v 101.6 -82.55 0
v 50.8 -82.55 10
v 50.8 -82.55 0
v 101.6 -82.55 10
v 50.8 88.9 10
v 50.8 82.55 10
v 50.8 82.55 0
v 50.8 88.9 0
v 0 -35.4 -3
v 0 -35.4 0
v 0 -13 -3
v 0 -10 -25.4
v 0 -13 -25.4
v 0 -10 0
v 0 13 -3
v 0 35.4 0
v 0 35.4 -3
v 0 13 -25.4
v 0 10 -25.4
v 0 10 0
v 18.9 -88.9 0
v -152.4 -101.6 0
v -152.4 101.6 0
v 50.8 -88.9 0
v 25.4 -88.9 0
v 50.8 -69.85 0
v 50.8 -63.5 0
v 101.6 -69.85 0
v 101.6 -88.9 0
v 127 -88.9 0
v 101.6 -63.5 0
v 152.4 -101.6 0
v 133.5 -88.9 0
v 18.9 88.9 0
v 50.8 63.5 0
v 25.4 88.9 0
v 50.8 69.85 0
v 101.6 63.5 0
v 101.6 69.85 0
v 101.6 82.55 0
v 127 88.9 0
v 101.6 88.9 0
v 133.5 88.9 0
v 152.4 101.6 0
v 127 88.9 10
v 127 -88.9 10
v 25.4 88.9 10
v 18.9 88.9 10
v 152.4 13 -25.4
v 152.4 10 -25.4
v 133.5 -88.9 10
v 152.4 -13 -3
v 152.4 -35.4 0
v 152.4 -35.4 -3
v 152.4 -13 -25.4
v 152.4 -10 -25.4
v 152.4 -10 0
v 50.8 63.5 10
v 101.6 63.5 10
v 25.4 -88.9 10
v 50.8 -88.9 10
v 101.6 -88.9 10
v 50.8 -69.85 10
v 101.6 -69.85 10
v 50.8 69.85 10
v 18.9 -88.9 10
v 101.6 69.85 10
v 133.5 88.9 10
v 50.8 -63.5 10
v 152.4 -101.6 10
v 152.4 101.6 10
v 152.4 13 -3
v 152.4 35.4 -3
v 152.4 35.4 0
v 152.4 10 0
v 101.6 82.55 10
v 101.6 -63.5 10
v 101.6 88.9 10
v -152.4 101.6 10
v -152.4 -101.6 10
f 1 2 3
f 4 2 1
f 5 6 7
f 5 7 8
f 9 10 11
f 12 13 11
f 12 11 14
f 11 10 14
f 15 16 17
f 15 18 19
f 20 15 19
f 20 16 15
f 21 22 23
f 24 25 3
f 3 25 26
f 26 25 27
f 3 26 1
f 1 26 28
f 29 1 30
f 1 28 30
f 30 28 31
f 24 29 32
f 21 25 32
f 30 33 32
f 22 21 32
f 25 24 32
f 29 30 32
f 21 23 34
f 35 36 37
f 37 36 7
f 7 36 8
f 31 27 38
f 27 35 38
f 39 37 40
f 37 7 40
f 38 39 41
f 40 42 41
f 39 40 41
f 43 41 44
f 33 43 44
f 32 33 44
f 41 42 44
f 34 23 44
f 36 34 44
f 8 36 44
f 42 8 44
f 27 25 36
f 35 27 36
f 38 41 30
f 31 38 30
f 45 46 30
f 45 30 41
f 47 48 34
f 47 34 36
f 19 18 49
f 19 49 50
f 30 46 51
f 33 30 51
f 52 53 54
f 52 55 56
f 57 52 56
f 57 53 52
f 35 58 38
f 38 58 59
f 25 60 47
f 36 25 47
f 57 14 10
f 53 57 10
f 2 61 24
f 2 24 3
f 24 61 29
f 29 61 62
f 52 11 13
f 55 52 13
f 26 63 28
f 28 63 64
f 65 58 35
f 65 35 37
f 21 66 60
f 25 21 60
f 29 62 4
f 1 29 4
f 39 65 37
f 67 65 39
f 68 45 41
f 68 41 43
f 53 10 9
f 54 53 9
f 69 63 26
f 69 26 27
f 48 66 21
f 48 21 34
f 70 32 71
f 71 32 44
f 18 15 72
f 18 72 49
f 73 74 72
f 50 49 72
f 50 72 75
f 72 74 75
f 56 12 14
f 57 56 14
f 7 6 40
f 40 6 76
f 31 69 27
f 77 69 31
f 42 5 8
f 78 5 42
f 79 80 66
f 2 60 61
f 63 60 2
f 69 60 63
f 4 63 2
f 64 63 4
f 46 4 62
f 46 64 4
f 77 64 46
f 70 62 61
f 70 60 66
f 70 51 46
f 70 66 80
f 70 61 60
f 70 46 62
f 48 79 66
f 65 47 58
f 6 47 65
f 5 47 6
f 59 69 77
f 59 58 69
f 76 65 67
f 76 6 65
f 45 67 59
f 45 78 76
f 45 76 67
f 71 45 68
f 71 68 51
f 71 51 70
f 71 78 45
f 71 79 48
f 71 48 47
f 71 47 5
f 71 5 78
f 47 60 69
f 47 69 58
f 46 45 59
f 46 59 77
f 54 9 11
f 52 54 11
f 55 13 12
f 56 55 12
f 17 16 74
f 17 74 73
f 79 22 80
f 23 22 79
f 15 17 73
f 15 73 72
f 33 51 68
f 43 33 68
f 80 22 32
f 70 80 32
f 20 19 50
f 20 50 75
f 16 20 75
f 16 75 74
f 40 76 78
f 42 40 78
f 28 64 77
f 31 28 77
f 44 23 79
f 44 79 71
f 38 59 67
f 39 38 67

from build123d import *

# Parameters (mm, degrees)
F0_W     = 304.8
F0_H     = 203.2
F1_DEPTH = 10
F2_W     = 50.8
F2_H     = 6.35
F2_W_2   = 6.5
F2_H_2   = 177.8
F3_DEPTH = 25
F5_DEPTH = 152.4


with BuildPart() as f1:
    # F0 (on Top) → F1 (new body)
    with BuildSketch(Plane.XY):
        Rectangle(F0_W, F0_H)
    extrude(amount=F1_DEPTH)

    # F2 (on face) → F3 (cut)
    with BuildSketch(Plane.XY.offset(10)):
        with Locations((76.2, 85.725)):
            Rectangle(F2_W, F2_H)
        with Locations((76.2, 66.675)):
            Rectangle(F2_W, F2_H)
        with Locations((76.2, -66.675)):
            Rectangle(F2_W, F2_H)
        with Locations((76.2, -85.725)):
            Rectangle(F2_W, F2_H)
        with Locations((130.25, 0)):
            Rectangle(F2_W_2, F2_H_2)
        with Locations((22.15, 0)):
            Rectangle(F2_W_2, F2_H_2)
    extrude(amount=-F3_DEPTH, mode=Mode.SUBTRACT)


with BuildPart() as f5:
    # F4 (on Right) → F5 (new body, through all)
    with BuildSketch(Plane.YZ):
        Polygon((-35.4, 0), (-35.4, -3), (-13, -3), (-13, -25.4), (-10, -25.4), (-10, -3), (-10, 0), align=None)
    extrude(amount=F5_DEPTH)


with BuildPart() as f6_1:
    # F6: instance of F5
    add(f5.part.mirror(Plane.XZ))


solid = Compound([f1.part, f5.part, f6_1.part])
